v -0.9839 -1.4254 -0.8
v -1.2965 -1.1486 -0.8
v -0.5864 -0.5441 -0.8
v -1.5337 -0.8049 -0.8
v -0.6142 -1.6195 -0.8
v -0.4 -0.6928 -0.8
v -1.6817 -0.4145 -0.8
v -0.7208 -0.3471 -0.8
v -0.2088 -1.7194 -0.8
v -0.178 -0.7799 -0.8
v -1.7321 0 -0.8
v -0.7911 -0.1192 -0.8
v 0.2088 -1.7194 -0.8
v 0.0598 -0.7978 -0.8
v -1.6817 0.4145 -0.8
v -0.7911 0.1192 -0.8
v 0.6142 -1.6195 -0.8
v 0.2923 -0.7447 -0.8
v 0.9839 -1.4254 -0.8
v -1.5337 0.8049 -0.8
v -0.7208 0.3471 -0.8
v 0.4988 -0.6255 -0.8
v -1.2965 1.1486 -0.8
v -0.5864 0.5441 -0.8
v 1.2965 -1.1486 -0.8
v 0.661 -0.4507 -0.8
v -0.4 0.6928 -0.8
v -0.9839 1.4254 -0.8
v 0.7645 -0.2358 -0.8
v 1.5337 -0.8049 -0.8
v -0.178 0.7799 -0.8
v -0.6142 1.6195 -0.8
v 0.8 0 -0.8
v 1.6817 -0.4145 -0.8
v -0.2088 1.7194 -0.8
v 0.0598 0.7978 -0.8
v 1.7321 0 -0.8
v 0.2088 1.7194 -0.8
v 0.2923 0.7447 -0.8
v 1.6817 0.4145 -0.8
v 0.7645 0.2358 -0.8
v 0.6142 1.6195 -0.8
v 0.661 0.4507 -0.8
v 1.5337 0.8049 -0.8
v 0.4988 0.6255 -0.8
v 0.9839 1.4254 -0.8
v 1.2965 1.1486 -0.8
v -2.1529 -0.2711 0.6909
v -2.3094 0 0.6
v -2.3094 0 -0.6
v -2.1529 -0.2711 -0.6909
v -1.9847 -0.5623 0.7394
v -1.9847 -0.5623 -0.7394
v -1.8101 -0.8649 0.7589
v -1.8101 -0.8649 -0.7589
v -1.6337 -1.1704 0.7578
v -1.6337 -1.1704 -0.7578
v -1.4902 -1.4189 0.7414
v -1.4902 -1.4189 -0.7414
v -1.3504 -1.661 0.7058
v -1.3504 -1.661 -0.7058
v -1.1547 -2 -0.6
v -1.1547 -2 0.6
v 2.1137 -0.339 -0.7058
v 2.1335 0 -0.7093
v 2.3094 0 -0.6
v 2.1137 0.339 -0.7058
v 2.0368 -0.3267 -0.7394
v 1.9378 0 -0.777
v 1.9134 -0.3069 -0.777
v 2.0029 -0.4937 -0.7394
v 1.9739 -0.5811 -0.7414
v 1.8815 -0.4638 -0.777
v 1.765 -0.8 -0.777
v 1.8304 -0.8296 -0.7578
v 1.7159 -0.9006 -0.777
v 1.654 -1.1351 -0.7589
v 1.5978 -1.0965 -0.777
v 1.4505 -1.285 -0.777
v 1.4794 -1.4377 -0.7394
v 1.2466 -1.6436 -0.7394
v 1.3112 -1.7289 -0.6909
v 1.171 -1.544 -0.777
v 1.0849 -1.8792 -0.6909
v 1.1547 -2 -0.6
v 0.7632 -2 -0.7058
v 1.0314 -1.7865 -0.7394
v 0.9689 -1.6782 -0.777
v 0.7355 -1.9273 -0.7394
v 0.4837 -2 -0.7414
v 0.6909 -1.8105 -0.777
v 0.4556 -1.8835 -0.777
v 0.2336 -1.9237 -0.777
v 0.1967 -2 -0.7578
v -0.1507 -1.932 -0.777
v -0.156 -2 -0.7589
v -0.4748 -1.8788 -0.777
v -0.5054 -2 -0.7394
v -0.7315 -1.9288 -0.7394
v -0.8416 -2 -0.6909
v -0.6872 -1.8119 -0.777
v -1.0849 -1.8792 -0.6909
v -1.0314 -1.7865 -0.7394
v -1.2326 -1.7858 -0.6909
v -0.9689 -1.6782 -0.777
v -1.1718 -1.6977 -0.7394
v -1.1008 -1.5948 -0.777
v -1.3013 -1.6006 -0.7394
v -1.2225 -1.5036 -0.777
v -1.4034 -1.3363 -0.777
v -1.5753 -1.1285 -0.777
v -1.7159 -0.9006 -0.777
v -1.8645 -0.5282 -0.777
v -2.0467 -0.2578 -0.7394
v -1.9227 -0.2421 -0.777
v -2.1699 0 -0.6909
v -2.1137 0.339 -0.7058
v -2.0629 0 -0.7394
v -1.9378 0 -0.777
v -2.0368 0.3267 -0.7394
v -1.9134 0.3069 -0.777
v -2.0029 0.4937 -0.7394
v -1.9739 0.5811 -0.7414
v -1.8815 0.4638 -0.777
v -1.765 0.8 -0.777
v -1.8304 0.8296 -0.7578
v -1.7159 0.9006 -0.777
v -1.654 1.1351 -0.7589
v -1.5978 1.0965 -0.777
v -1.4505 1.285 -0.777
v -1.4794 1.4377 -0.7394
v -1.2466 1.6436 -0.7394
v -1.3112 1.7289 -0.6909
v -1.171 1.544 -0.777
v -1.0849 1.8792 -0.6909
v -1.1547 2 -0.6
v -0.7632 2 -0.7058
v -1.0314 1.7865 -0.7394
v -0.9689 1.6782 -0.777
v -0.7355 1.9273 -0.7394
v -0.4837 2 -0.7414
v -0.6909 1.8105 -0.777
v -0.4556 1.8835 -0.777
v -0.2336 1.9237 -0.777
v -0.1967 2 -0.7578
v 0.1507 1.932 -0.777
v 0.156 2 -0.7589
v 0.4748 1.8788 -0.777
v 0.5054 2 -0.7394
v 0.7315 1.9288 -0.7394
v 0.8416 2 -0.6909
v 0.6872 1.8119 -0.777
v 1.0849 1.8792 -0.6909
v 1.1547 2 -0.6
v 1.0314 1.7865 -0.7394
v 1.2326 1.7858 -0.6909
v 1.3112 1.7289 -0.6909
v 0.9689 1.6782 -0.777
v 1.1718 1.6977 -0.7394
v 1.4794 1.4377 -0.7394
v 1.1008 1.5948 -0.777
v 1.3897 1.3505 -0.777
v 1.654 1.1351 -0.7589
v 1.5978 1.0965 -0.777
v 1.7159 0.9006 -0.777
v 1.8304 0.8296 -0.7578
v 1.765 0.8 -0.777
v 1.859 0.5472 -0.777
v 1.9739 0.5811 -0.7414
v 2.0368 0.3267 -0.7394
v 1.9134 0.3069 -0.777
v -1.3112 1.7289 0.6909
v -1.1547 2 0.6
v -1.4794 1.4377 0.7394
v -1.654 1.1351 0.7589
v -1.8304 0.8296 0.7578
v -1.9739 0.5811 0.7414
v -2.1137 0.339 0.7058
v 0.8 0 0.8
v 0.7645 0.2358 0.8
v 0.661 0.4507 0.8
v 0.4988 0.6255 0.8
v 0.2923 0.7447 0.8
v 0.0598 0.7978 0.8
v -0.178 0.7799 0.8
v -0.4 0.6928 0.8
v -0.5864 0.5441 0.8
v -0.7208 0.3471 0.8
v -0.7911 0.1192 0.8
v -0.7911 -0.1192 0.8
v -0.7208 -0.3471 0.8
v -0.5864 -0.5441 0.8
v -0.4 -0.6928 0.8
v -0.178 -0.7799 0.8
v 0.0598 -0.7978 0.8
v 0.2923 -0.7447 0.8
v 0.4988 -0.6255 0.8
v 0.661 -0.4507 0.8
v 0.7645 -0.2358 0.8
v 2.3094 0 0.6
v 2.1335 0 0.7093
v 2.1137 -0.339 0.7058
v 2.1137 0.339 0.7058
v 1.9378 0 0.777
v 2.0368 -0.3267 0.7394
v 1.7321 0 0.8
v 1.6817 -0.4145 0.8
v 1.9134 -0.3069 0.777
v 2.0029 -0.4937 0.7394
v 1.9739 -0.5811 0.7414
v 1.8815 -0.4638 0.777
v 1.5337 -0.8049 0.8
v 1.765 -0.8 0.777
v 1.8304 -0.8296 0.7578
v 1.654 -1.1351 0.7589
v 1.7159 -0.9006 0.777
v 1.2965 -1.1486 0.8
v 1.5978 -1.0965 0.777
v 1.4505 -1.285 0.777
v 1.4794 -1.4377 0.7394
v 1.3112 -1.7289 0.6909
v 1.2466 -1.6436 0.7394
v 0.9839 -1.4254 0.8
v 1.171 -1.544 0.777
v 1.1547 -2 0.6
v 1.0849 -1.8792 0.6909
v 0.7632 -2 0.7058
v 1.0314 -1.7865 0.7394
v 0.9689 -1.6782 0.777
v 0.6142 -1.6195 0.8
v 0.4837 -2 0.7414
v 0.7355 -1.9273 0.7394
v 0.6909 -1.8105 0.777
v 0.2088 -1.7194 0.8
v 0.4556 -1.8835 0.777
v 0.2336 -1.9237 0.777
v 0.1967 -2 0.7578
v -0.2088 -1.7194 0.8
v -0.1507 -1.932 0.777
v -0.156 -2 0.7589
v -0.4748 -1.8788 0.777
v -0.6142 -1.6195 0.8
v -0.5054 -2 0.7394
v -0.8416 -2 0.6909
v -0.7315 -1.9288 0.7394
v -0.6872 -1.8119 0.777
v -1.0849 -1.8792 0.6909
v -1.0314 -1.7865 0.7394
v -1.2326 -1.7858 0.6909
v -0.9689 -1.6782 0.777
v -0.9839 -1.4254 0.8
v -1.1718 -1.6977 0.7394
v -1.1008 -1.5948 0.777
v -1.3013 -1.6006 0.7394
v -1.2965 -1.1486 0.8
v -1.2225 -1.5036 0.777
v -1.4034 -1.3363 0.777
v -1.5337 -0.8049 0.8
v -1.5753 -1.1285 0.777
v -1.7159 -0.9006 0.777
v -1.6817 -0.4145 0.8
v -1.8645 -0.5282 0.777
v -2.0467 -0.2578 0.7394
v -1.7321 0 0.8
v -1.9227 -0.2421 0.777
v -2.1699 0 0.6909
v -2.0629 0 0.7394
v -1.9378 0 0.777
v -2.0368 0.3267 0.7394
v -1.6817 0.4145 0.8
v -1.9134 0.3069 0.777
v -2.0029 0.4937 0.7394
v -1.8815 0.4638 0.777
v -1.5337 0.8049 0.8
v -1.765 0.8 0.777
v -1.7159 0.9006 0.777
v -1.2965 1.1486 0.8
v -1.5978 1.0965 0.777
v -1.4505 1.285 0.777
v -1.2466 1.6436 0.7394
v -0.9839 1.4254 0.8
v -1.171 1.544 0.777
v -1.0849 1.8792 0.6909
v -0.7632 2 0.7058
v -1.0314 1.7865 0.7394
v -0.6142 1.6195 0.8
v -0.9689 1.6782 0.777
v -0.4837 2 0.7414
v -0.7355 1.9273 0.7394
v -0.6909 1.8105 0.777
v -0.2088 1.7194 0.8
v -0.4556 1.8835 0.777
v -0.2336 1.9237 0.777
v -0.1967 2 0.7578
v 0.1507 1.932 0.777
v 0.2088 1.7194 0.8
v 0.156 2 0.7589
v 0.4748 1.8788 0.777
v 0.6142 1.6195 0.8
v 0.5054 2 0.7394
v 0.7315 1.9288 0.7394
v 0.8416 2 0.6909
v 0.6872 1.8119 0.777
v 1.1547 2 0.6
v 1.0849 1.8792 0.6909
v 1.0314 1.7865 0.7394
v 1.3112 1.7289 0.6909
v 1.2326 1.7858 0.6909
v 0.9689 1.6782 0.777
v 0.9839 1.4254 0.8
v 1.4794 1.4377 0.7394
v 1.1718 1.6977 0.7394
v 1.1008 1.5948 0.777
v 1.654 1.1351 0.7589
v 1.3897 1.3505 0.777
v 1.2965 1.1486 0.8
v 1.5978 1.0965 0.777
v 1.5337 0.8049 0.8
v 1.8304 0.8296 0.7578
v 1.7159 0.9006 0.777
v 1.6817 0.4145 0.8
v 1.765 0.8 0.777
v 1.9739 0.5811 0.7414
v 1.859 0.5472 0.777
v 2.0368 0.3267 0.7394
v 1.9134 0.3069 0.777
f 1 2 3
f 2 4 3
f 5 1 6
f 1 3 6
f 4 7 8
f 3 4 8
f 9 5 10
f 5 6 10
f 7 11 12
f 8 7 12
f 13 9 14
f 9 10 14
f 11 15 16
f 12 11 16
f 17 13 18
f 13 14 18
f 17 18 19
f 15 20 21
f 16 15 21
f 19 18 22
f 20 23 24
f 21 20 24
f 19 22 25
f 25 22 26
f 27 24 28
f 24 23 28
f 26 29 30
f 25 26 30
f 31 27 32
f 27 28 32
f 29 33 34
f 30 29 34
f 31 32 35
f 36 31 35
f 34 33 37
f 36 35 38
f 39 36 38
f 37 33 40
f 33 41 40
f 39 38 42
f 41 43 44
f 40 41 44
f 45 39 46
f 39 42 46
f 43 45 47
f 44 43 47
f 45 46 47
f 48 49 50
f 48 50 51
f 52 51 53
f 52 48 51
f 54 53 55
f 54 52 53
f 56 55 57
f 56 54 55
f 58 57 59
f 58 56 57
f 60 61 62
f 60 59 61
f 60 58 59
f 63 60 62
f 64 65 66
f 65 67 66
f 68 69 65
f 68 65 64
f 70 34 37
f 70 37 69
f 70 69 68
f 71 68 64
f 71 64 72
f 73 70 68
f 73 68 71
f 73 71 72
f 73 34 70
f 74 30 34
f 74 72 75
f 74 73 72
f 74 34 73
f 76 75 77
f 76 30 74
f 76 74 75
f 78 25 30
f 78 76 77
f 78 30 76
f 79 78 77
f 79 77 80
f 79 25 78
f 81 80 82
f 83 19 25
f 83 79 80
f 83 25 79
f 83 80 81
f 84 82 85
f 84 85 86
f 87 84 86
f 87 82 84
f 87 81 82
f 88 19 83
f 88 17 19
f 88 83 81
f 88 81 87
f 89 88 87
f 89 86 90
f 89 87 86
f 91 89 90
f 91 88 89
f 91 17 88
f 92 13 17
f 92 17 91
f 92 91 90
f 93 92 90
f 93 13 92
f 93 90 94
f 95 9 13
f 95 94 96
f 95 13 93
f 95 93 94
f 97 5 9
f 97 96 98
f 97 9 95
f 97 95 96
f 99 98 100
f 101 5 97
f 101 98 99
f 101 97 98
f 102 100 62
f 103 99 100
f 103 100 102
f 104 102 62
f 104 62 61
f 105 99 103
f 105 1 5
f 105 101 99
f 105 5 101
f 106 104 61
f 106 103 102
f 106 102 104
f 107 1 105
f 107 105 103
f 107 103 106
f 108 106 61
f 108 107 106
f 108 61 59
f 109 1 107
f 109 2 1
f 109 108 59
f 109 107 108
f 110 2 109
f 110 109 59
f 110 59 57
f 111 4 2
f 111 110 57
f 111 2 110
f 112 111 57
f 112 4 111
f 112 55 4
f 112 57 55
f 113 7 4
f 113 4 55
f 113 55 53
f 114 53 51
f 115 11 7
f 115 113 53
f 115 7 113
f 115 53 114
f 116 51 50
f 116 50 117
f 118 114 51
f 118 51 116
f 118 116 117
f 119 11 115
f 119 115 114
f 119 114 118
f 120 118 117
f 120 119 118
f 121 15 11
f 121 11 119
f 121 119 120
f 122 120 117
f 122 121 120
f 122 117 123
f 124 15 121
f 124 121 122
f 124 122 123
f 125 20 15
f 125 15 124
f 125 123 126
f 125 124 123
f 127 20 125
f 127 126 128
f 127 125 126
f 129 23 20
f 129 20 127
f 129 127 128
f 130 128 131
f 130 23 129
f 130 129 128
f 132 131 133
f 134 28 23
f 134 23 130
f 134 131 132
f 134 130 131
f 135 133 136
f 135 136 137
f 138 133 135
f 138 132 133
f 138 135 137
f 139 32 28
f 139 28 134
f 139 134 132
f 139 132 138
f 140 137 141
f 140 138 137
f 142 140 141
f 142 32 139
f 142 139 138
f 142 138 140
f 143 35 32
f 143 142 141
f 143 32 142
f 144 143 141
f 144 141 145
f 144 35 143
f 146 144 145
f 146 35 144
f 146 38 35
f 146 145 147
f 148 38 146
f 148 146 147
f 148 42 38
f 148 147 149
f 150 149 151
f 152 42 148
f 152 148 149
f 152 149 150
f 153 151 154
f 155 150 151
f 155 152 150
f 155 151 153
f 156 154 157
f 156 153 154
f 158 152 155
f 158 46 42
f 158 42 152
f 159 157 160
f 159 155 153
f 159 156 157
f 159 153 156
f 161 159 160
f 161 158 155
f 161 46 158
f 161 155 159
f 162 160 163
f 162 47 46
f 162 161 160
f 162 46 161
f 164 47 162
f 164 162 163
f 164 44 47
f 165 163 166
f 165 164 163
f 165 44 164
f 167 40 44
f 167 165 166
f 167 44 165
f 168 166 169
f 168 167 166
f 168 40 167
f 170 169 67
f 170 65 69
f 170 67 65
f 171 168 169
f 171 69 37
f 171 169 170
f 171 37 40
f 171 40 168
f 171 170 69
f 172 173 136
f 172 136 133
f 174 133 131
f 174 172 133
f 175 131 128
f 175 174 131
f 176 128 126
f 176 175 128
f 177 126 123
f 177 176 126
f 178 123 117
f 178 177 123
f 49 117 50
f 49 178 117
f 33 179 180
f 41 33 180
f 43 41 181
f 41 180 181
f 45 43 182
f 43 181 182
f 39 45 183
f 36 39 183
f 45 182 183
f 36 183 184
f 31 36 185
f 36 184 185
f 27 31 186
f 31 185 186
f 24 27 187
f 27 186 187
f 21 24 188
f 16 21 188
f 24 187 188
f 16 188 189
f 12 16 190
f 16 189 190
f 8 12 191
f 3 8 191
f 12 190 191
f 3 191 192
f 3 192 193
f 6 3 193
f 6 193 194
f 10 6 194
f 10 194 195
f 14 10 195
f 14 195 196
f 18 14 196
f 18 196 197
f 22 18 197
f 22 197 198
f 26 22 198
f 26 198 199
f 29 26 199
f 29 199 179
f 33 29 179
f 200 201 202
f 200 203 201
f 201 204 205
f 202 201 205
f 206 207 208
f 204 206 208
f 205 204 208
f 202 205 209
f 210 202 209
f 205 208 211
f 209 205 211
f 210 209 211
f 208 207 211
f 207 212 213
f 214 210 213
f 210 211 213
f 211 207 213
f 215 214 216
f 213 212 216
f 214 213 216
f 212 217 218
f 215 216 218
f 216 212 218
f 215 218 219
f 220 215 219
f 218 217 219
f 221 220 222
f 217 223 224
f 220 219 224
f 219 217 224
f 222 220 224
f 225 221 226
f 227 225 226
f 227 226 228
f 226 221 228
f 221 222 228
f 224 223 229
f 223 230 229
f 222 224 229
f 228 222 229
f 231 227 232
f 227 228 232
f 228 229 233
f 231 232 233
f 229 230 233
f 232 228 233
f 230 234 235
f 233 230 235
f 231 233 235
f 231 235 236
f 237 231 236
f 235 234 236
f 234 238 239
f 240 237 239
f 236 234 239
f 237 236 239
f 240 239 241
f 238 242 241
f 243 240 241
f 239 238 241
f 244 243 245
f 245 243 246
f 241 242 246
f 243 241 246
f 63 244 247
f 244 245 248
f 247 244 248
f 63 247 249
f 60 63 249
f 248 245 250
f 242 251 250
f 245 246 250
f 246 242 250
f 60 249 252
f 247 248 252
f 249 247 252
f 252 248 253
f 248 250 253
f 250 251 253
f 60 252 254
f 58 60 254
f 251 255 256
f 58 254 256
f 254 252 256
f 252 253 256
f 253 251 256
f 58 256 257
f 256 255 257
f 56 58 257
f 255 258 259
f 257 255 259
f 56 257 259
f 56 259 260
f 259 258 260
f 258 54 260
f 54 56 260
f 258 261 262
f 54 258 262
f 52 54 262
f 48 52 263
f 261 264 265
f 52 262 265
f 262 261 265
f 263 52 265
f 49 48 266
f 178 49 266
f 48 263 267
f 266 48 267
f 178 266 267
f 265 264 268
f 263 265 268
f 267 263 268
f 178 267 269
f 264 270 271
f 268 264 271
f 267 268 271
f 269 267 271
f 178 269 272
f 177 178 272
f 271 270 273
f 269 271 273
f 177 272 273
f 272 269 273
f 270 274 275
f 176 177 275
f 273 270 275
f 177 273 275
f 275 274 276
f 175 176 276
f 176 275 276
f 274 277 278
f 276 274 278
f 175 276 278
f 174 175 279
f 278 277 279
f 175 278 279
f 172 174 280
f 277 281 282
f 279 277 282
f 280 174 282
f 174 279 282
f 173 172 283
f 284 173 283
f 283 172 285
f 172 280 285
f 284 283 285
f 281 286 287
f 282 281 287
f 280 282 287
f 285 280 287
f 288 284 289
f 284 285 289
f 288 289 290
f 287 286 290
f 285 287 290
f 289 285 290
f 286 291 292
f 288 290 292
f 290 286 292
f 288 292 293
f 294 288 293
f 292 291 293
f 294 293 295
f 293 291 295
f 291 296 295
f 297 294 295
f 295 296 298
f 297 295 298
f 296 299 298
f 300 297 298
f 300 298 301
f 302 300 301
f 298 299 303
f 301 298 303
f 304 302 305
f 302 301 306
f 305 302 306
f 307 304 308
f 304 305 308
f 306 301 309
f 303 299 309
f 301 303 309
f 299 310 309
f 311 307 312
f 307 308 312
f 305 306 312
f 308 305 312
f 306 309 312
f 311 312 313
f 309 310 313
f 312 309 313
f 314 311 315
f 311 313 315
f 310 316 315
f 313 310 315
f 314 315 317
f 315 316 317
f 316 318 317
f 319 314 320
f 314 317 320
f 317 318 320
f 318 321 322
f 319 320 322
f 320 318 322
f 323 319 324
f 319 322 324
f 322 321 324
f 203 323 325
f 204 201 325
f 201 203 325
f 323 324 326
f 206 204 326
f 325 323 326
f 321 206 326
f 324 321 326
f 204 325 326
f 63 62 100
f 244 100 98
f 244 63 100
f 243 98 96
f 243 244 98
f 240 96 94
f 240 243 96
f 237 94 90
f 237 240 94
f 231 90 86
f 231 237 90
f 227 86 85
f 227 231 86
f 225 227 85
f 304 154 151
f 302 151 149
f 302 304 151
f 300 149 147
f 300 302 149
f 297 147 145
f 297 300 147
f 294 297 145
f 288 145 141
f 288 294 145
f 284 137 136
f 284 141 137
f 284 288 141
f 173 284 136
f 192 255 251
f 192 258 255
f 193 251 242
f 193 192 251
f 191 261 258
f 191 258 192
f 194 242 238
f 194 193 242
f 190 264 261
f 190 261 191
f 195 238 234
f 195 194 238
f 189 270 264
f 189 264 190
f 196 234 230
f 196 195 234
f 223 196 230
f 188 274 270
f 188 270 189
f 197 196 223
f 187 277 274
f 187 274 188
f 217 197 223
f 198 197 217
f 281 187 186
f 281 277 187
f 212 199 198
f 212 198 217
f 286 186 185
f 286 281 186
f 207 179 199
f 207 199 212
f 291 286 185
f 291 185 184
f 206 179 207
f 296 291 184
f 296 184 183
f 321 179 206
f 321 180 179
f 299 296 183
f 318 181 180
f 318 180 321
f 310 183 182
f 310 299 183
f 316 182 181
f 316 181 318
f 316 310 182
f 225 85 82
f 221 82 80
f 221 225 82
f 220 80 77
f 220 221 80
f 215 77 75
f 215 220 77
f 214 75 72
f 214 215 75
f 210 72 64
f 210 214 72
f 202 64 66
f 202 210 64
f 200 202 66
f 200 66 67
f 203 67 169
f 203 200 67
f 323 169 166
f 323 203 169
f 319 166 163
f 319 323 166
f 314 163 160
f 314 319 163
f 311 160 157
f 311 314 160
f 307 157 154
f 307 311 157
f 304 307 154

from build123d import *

# Parameters (mm, degrees)
EXTRUDE_319_DEPTH = 0.8
HOLE_WIZARD_1_D   = 1.6


with BuildPart() as part:
    # 草图1 → Extrude 319 (new, symmetric)
    with BuildSketch(Plane.XY):
        Polygon((1.154700538, 2), (-1.154700538, 2), (-2.309401077, 0), (-1.154700538, -2), (1.154700538, -2), (2.309401077, 0), align=None)
    extrude(amount=EXTRUDE_319_DEPTH, both=True)

    # 草图2 → 切除-旋转1 (revolve, cut)
    with BuildSketch(Plane(origin=(0, 0, 0), x_dir=(1, 0, 0), z_dir=(0, 1, 0))):
        with BuildLine():
            Line((1.732050808, 0.8), (2.309401077, 0.8))
            Line((2.309401077, 0.8), (2.309401077, 0.6))
            ThreePointArc((2.309401077, 0.6), (2.037555854, 0.74858377), (1.732050808, 0.8))
        make_face()
        with BuildLine():
            Line((2.309401077, -0.8), (2.309401077, -0.6))
            ThreePointArc((2.309401077, -0.6), (2.037555854, -0.74858377), (1.732050808, -0.8))
            Line((1.732050808, -0.8), (2.309401077, -0.8))
        make_face()
    revolve(axis=Axis((0, 0, 0), (0, 0, -1)), mode=Mode.SUBTRACT)

    # Hole Wizard 1 (through all)
    with Locations(Plane(origin=(0, 0, -0.8), x_dir=(-1, 0, 0), z_dir=(0, 0, -1))):
        with Locations((0, 0)):
            Hole(HOLE_WIZARD_1_D / 2)


solid = part.part
